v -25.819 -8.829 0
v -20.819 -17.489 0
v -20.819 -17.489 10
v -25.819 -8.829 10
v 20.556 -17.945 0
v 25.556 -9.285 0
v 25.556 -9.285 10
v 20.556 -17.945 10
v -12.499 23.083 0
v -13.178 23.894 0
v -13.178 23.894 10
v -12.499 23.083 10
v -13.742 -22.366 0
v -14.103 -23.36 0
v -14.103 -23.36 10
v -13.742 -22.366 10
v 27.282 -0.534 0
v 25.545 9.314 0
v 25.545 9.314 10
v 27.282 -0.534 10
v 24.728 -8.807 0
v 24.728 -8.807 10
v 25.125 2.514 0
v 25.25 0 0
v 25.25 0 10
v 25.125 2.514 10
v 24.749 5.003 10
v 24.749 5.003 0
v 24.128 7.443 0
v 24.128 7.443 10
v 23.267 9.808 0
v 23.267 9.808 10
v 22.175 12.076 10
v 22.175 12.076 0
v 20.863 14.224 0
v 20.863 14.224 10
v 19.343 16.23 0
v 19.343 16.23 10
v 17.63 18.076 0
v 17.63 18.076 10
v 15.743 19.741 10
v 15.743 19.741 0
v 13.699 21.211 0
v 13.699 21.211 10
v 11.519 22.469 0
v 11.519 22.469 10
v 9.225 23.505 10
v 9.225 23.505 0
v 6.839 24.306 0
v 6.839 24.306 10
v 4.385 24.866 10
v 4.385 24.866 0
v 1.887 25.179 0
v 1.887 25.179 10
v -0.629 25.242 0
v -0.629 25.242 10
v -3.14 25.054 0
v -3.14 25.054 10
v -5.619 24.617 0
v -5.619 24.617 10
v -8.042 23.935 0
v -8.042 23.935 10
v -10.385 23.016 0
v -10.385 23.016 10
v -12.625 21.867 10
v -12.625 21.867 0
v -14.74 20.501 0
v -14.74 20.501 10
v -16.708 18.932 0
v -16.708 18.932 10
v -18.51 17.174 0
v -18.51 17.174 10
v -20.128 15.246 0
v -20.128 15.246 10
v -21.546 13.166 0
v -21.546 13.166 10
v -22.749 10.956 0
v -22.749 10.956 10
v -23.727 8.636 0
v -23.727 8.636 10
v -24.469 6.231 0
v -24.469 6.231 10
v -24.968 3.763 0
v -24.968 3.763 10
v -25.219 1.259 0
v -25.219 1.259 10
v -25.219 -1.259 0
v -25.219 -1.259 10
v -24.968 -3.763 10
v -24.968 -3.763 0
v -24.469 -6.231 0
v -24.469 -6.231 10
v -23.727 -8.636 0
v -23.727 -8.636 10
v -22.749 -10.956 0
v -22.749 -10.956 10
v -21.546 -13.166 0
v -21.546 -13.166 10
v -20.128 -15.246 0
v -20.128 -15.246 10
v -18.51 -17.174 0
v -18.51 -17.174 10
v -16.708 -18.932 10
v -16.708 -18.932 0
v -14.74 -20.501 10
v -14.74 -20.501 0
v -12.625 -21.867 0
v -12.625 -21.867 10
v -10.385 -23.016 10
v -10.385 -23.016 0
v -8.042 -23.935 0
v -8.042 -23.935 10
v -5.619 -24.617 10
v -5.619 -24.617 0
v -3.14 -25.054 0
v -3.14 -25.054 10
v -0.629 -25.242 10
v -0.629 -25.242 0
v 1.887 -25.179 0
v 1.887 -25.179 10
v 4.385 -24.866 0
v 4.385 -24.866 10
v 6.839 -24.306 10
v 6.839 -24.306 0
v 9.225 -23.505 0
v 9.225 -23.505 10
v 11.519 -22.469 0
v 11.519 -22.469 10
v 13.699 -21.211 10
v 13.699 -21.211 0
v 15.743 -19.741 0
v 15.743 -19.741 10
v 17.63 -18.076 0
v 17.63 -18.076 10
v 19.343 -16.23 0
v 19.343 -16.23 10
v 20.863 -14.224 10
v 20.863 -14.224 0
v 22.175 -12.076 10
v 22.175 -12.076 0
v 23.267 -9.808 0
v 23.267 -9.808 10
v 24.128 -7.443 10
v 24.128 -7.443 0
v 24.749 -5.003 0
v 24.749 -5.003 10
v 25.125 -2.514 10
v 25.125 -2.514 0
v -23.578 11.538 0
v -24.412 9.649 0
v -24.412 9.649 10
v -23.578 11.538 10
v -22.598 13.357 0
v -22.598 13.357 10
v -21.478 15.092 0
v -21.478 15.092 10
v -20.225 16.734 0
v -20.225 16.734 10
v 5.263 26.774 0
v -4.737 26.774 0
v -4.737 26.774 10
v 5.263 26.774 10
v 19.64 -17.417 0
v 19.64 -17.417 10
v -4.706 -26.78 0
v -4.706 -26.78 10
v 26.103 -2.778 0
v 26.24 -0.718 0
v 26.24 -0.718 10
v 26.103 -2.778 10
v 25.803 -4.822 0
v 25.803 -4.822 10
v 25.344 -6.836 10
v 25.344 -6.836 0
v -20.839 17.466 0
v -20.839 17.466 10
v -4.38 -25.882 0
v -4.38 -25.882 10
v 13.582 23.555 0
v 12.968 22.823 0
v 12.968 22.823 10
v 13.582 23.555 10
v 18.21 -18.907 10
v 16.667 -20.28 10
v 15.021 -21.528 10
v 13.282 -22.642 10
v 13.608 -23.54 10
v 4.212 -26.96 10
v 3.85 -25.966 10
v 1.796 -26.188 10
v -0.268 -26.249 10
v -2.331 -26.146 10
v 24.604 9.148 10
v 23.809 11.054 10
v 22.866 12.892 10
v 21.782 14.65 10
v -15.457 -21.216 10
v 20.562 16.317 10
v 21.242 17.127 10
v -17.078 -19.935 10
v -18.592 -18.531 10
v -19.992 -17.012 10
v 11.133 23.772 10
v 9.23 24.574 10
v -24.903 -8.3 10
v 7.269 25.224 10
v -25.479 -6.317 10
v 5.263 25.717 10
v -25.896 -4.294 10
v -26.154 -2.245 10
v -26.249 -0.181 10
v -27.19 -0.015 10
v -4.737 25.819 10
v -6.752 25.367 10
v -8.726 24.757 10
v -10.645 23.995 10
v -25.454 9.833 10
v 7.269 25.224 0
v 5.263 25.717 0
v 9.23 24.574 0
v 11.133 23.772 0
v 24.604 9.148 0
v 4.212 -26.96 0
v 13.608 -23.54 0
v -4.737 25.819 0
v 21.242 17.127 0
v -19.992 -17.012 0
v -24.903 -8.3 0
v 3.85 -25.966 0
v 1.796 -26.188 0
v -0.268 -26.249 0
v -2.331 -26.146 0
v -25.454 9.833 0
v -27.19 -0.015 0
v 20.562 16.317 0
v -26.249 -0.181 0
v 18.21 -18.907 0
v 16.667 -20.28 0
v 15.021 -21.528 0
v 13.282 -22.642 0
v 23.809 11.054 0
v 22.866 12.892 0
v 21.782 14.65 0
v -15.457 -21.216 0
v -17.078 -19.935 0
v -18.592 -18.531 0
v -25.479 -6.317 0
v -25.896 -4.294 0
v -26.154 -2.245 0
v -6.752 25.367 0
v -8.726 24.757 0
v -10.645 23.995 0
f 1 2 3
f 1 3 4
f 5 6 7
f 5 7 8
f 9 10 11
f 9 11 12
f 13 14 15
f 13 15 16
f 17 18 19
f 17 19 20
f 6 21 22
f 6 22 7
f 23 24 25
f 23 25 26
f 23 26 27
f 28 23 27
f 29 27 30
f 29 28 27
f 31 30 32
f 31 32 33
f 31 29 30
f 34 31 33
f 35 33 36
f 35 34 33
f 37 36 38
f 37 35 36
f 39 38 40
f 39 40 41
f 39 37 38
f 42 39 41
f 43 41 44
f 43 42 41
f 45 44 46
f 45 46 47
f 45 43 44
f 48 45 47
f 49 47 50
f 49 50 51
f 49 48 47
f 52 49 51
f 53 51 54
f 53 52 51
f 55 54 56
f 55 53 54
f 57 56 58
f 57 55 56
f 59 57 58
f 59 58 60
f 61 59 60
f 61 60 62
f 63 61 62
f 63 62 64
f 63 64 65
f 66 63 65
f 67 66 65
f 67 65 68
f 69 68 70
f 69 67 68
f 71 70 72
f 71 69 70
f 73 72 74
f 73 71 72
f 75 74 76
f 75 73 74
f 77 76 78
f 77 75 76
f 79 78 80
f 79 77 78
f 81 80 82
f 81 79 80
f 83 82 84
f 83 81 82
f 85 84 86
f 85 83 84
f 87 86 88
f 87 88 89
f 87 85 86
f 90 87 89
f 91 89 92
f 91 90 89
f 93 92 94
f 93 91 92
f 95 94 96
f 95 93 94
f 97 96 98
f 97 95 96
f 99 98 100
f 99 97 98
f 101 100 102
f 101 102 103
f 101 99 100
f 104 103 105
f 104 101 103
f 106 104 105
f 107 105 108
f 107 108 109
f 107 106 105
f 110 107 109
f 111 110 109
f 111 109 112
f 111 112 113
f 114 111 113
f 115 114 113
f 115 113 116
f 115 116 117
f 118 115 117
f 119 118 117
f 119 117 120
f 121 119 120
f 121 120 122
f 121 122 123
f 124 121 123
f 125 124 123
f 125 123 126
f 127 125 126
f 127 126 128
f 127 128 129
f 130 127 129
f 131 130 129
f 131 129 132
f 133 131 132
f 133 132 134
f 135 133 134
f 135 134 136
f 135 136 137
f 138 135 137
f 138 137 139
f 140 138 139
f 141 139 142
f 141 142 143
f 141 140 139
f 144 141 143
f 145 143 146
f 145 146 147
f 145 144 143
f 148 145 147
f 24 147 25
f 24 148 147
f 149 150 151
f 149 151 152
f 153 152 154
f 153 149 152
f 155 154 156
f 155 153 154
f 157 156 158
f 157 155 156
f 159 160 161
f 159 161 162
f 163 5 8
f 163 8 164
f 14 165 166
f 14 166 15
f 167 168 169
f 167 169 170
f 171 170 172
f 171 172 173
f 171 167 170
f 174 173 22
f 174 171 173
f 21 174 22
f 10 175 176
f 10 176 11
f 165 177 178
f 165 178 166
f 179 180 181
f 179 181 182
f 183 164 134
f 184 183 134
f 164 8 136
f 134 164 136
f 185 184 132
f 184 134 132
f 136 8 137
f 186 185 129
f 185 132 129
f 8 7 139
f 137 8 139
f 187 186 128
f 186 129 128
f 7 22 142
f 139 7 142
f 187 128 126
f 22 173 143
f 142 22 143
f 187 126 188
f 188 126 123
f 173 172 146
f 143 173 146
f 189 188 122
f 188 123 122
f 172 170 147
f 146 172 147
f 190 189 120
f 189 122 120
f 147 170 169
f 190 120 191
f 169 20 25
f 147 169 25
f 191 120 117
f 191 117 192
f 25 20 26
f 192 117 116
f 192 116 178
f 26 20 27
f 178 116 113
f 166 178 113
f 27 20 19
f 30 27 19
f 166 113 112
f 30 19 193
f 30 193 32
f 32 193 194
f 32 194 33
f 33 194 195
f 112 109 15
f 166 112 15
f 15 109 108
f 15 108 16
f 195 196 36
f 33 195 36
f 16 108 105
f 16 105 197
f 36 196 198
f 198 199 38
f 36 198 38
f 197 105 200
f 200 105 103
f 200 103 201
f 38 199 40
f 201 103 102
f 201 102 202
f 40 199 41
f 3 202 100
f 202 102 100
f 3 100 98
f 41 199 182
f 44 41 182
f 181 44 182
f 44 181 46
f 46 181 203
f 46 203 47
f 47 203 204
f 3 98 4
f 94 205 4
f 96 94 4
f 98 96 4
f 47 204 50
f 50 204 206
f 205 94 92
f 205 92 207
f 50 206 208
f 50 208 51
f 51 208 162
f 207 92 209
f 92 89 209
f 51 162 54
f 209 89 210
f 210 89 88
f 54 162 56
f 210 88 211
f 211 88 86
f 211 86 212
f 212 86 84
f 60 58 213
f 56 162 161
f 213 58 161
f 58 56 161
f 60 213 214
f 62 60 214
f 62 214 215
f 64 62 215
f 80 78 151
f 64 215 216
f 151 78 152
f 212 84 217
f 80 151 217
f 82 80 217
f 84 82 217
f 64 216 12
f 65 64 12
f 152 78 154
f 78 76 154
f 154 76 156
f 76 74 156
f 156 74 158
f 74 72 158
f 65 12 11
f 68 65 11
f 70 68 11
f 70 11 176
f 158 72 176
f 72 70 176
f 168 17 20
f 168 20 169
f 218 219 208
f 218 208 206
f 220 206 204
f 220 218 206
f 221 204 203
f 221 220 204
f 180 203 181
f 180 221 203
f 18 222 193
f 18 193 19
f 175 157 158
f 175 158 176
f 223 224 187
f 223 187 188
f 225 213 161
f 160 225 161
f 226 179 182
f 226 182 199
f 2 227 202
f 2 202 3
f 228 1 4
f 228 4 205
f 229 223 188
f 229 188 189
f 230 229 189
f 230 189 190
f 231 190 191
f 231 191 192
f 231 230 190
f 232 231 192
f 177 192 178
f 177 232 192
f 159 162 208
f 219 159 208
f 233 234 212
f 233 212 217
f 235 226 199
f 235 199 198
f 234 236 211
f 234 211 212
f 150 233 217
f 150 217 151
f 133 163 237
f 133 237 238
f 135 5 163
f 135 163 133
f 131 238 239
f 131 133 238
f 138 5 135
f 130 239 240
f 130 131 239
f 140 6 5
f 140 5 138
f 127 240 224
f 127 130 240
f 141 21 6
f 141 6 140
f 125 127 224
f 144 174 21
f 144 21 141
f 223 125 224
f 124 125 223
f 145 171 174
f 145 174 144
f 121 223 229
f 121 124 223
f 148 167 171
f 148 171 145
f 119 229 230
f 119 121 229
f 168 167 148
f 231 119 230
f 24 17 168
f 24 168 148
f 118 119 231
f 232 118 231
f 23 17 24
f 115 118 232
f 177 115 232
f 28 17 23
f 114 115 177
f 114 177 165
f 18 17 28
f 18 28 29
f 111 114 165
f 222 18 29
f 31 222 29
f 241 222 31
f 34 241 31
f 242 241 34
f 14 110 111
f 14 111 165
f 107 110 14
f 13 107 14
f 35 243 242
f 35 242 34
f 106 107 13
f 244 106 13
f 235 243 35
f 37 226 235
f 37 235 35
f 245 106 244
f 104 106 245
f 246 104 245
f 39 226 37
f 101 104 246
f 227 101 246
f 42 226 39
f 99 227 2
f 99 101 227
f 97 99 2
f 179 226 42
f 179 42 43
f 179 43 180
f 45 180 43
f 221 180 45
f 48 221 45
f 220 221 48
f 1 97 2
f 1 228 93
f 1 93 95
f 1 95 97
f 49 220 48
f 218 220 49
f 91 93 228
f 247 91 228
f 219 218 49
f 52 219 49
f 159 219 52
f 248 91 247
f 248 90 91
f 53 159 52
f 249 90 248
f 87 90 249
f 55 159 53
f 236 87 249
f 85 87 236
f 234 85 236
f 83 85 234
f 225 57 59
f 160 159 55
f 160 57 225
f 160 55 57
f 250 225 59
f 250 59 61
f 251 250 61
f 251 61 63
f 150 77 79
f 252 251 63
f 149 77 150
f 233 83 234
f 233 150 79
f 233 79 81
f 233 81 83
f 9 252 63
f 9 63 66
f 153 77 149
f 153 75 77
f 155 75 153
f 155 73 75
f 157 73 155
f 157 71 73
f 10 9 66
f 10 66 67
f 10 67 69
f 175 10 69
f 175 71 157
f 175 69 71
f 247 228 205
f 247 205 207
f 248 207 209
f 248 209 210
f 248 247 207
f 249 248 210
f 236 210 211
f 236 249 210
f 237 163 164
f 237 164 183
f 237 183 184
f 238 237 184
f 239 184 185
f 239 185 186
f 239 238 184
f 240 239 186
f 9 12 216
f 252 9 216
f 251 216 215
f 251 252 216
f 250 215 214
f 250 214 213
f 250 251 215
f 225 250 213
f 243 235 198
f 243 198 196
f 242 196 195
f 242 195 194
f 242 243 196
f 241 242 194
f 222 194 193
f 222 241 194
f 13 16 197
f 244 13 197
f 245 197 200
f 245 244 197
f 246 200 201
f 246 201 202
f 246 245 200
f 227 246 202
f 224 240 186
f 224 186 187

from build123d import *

# Parameters (mm, degrees)
CROQUIS1_R              = 25.25
SALIENTE_EXTRUIR1_DEPTH = 10


with BuildPart() as part:
    # Croquis1 → Saliente-Extruir1 (new body)
    with BuildSketch(Plane.XY):
        with BuildLine():
            Line((12.967631227, 22.823300382), (13.581702718, 23.555122287))
            Line((13.581702718, 23.555122287), (21.242147149, 17.12724619))
            Line((21.242147149, 17.12724619), (20.562408201, 16.317164857))
            ThreePointArc((20.562408201, 16.317164857), (22.866059206, 12.892084254), (24.60431654, 9.148229752))
            Line((24.60431654, 9.148229752), (25.545128646, 9.31412031))
            Line((25.545128646, 9.31412031), (27.281610423, -0.53395722))
            Line((27.281610423, -0.53395722), (26.240189935, -0.717587751))
            ThreePointArc((26.240189935, -0.717587751), (25.803289612, -4.822110037), (24.728368697, -8.807399251))
            Line((24.728368697, -8.807399251), (25.555704978, -9.285062076))
            Line((25.555704978, -9.285062076), (20.555704978, -17.945316114))
            Line((20.555704978, -17.945316114), (19.639895171, -17.416573075))
            ThreePointArc((19.639895171, -17.416573075), (16.666874037, -20.27998545), (13.281742316, -22.641948261))
            Line((13.281742316, -22.641948261), (13.608482931, -23.539660724))
            Line((13.608482931, -23.539660724), (4.211556723, -26.959862157))
            Line((4.211556723, -26.959862157), (3.849875184, -25.966150294))
            ThreePointArc((3.849875184, -25.966150294), (-0.268157132, -26.248630283), (-4.379558905, -25.882078042))
            Line((-4.379558905, -25.882078042), (-4.706299521, -26.779790505))
            Line((-4.706299521, -26.779790505), (-14.103225729, -23.359589072))
            Line((-14.103225729, -23.359589072), (-13.741544189, -22.365877208))
            ThreePointArc((-13.741544189, -22.365877208), (-17.077714598, -19.935249286), (-19.991615841, -17.01169586))
            Line((-19.991615841, -17.01169586), (-20.818952122, -17.489358685))
            Line((-20.818952122, -17.489358685), (-25.818952122, -8.829104647))
            Line((-25.818952122, -8.829104647), (-24.903142315, -8.300361608))
            ThreePointArc((-24.903142315, -8.300361608), (-25.896419606, -4.293943593), (-26.249373543, -0.181352121))
            Line((-26.249373543, -0.181352121), (-27.190185649, -0.015461563))
            Line((-27.190185649, -0.015461563), (-25.453703872, 9.832615967))
            Line((-25.453703872, 9.832615967), (-24.412283385, 9.648985436))
            ThreePointArc((-24.412283385, 9.648985436), (-22.597902074, 13.35654603), (-20.224757635, 16.733848291))
            Line((-20.224757635, 16.733848291), (-20.838829125, 17.465670196))
            Line((-20.838829125, 17.465670196), (-13.178384694, 23.893546292))
            Line((-13.178384694, 23.893546292), (-12.498645746, 23.083464959))
            ThreePointArc((-12.498645746, 23.083464959), (-8.725575014, 24.757359324), (-4.736752856, 25.819095112))
            Line((-4.736752856, 25.819095112), (-4.736752856, 26.774420761))
            Line((-4.736752856, 26.774420761), (5.263247144, 26.774420761))
            Line((5.263247144, 26.774420761), (5.263247144, 25.716934683))
            ThreePointArc((5.263247144, 25.716934683), (9.229545569, 24.573929042), (12.967631227, 22.823300382))
        make_face()
        Circle(CROQUIS1_R, mode=Mode.SUBTRACT)
    extrude(amount=SALIENTE_EXTRUIR1_DEPTH)


solid = part.part
